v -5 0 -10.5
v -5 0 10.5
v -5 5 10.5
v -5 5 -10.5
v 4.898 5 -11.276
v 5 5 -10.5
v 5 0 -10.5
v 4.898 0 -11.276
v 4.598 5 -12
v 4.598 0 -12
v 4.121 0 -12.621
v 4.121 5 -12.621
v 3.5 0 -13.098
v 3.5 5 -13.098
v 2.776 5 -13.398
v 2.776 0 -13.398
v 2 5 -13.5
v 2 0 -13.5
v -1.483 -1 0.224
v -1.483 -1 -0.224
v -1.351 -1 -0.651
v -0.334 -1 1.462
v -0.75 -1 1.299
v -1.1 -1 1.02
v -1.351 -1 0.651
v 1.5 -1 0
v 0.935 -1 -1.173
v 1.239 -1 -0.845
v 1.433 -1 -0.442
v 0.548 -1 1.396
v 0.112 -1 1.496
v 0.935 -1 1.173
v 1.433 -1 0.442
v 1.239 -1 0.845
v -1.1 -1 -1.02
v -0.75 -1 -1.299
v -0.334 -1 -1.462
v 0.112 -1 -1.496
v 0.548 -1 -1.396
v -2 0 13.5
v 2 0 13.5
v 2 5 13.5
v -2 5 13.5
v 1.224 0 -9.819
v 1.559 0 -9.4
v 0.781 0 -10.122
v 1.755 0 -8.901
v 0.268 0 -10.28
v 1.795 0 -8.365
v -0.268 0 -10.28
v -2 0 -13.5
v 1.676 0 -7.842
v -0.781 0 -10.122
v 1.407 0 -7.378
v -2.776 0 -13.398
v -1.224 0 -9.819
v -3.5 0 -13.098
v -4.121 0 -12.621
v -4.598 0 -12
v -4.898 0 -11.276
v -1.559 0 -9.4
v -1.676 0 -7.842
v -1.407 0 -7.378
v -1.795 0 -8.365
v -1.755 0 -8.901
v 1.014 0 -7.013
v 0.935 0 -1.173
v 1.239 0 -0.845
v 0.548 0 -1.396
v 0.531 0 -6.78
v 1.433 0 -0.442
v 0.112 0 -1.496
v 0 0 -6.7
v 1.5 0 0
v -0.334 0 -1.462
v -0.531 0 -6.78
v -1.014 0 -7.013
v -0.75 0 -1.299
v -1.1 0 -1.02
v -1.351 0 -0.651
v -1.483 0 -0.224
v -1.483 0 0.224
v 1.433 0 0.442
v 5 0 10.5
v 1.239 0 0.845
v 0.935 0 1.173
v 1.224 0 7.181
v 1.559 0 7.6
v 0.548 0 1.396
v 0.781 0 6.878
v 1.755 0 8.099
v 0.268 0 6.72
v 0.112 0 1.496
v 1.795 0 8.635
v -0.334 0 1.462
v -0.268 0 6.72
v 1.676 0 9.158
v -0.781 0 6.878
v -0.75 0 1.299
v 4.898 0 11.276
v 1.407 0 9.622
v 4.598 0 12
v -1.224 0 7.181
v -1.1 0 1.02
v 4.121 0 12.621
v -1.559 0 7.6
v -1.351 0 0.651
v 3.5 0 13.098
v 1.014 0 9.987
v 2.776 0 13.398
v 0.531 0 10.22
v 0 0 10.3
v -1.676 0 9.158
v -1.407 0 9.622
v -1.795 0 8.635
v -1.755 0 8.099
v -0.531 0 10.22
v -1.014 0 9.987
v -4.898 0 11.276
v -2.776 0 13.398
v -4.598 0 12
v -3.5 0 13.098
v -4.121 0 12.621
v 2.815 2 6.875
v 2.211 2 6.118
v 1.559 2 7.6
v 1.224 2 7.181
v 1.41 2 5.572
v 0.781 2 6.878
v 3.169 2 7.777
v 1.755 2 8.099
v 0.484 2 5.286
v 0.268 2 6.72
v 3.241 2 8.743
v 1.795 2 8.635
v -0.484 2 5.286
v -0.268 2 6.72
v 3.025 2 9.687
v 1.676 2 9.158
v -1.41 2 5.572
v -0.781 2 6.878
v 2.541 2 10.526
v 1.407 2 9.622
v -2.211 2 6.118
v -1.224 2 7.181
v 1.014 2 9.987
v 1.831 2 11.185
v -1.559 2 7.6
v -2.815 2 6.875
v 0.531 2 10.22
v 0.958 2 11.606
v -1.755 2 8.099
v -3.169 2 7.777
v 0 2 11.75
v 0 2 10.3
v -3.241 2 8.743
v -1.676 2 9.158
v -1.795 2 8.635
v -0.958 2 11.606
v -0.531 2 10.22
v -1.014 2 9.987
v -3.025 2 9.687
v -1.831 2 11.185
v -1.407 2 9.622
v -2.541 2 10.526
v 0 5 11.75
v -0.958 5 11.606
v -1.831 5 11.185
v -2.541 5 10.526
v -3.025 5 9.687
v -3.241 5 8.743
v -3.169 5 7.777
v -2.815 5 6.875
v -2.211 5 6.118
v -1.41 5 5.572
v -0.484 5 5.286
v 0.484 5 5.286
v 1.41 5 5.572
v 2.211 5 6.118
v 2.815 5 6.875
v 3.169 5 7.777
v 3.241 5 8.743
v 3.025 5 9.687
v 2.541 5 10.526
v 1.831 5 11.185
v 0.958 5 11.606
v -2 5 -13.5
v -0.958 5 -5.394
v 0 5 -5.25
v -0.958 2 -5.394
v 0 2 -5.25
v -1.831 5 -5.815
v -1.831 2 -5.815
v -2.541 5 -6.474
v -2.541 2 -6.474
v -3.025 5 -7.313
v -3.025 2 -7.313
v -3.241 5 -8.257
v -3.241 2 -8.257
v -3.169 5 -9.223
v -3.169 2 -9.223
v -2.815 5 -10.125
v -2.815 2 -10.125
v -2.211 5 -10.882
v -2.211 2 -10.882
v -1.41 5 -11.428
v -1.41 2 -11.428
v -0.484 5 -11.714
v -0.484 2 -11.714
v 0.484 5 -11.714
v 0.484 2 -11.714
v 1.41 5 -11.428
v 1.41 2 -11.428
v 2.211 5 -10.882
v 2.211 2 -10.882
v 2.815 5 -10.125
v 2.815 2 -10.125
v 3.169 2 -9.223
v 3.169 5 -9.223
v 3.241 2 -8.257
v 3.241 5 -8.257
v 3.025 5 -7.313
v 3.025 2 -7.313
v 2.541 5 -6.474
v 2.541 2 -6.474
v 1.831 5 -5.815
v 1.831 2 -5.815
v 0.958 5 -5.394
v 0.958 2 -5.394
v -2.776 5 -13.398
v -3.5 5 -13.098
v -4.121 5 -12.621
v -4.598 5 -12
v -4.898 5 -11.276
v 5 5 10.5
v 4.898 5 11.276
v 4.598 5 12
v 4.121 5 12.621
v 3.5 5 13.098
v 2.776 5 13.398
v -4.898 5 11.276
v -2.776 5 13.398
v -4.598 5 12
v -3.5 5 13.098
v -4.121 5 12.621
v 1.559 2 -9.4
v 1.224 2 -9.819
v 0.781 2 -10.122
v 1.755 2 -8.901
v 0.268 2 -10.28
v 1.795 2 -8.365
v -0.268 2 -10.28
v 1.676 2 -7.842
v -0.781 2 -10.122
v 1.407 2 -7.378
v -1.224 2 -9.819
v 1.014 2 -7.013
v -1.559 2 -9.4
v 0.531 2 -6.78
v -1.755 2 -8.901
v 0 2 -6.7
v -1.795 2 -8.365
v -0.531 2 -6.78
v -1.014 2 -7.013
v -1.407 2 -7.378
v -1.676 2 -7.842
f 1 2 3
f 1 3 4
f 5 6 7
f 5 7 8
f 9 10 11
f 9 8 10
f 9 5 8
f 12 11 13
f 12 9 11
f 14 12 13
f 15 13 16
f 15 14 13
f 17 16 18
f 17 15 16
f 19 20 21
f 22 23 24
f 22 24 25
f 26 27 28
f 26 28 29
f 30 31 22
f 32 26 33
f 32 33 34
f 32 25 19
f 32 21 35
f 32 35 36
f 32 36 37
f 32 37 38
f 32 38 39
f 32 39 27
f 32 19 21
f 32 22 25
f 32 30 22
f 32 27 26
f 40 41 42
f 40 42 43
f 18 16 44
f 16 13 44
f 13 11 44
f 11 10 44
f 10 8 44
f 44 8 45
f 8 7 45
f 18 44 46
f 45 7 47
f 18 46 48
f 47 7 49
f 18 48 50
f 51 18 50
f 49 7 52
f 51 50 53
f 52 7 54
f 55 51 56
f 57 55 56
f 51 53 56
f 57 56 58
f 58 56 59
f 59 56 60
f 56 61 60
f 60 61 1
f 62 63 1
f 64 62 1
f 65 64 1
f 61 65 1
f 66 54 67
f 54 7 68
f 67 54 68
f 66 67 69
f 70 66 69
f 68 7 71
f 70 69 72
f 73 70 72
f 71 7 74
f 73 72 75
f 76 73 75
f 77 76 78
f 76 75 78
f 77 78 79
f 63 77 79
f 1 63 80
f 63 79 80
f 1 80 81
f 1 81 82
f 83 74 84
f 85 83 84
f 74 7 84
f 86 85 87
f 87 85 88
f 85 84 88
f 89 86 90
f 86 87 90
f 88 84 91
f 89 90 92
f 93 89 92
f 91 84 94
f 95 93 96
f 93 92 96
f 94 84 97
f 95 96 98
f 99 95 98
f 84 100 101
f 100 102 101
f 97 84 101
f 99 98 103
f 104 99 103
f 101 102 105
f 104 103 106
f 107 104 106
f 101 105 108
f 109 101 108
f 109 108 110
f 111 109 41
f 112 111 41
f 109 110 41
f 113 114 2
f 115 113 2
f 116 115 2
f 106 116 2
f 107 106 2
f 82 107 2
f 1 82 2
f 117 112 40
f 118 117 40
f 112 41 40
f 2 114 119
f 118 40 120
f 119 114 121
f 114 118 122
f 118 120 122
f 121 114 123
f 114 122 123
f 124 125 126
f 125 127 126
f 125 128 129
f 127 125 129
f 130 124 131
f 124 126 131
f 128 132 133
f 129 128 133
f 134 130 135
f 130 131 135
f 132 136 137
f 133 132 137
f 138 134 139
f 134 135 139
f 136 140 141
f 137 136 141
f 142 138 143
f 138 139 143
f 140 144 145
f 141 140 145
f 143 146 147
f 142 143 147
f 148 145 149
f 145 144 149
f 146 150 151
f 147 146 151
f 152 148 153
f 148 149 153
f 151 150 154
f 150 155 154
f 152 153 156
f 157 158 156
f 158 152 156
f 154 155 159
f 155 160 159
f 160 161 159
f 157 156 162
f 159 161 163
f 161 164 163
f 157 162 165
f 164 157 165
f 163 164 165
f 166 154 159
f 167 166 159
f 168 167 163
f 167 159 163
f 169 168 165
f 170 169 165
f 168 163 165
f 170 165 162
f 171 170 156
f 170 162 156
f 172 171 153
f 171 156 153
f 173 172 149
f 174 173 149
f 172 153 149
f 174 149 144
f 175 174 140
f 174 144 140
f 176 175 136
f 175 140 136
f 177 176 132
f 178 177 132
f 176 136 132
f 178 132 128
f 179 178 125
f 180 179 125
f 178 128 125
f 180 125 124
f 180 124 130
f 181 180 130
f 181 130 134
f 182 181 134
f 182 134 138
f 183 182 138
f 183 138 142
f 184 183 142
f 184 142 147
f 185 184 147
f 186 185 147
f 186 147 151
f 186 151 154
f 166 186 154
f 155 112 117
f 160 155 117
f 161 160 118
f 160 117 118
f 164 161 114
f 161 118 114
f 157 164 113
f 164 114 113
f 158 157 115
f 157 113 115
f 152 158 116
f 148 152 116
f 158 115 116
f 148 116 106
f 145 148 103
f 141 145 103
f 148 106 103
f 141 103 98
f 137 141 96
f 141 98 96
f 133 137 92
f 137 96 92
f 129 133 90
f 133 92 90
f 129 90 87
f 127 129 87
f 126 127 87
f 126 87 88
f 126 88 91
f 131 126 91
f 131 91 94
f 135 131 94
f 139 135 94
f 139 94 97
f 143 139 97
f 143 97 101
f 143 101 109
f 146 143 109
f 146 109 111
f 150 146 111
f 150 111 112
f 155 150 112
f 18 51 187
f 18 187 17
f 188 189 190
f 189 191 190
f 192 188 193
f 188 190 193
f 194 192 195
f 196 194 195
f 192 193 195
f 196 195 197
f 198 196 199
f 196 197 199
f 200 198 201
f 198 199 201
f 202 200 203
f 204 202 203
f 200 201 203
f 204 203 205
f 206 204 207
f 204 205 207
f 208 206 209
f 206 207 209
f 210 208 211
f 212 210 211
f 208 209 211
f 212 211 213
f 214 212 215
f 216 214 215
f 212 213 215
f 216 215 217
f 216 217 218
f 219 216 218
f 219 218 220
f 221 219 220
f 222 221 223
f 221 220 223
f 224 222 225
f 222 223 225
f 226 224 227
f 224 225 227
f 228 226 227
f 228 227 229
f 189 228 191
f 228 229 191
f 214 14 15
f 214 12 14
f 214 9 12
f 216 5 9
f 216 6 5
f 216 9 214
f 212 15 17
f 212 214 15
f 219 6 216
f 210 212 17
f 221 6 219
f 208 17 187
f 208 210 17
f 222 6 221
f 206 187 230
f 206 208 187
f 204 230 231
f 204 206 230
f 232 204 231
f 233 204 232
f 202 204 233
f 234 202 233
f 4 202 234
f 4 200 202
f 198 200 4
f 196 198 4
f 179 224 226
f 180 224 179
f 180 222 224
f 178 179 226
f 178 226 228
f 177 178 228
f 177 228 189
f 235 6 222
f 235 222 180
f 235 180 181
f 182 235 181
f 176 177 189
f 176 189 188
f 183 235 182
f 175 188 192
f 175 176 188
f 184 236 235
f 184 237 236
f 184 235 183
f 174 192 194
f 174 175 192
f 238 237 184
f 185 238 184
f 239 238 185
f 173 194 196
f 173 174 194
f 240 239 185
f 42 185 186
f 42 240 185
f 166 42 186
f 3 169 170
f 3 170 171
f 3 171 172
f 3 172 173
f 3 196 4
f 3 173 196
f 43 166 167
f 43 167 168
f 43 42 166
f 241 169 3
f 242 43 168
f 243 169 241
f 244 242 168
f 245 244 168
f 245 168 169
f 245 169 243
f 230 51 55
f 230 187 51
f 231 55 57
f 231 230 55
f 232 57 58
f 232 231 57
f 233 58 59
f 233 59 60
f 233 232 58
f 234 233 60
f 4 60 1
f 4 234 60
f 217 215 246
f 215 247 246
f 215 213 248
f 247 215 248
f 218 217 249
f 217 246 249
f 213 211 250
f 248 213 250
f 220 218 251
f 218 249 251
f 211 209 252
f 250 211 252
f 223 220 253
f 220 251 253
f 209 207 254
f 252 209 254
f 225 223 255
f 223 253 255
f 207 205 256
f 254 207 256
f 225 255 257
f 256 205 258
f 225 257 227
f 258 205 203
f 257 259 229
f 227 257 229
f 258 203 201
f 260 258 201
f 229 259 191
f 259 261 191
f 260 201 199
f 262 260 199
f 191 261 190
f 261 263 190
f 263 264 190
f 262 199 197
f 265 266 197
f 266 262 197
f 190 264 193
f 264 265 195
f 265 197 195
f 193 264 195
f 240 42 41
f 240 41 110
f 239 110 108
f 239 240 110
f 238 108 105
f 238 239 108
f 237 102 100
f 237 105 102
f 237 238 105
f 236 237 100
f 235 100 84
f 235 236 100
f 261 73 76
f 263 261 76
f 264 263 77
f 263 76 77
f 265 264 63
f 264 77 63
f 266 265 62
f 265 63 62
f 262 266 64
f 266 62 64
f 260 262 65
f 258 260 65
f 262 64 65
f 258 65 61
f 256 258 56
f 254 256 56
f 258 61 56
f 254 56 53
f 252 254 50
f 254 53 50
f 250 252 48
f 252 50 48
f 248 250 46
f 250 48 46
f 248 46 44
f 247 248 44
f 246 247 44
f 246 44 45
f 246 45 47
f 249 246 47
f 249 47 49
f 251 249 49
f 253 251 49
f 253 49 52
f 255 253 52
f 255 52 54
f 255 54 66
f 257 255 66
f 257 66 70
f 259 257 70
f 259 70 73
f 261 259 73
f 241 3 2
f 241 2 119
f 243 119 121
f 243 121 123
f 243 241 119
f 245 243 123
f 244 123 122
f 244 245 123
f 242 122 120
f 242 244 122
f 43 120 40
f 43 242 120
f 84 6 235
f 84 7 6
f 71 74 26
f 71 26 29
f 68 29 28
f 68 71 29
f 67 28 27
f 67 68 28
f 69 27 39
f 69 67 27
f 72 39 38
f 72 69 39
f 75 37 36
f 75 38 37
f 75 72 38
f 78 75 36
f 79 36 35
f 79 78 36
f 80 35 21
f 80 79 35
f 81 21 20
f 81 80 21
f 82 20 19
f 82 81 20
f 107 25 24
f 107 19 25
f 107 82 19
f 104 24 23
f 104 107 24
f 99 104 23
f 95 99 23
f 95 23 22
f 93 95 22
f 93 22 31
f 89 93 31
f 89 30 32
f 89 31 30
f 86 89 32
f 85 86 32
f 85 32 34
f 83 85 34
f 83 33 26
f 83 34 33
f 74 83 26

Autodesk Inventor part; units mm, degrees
ref_plane "YZ Plane" through (0, 0, 0) normal (1, 0, 0) x (0, 1, 0)
ref_plane "XZ Plane" through (0, 0, 0) normal (0, 1, 0) x (-1, 0, 0)
ref_plane "XY Plane" through (0, 0, 0) normal (0, 0, 1) x (1, 0, 0)
sketch "Sketch1" plane through (0, 0, 0) normal (0, 1, 0) x (-1, 0, 0)
  line L0 (5, -13.5) -> (-5, -13.5)
  line L1 (-5, -13.5) -> (-5, 13.5)
  line L2 (-5, 13.5) -> (5, 13.5)
  line L3 (5, 13.5) -> (5, -13.5)
  line L4 (5, -13.5) -> (-5, 13.5) construction
  line L5 (-5, -13.5) -> (5, 13.5) construction
  circle A0 centre (0, -8.5) radius 3.25
  circle A1 centre (0, 8.5) radius 3.25
  circle A2 centre (0, 0) radius 1.5
  dimension "d0" = 17
  dimension "d1" = 6.5
  dimension "d2" = 6.5
  dimension "d3" = 3
  dimension "d4" = 5
  dimension "d5" = 5
  dimension "d6" = 5
extrude "Extrusion1" add sketch "Sketch1" along normal blind 5 contours L0 L1 L2 L3 | A0 | A1 | A2
sketch "Sketch2" plane through (0, 0, 0) normal (0, -1, 0) x (1, 0, 0)
  circle A0 centre (0, 0) radius 1.5
  dimension "d9" = 3
extrude "Extrusion2" add sketch "Sketch2" along normal blind 1
sketch "Sketch3" plane through (0, 5, 0) normal (0, 1, 0) x (1, 0, 0)
  line L0 (-5, -13.5) -> (5, -13.5) projected
  line L1 (5, -13.5) -> (5, 13.5) projected
  line L2 (5, 13.5) -> (-5, 13.5) projected
  line L3 (-5, 13.5) -> (-5, -13.5) projected
  point P0 (0, 0)
  point P1 (0, 8.5)
  point P2 (0, -8.5)
  dimension "d12" = 8.5
  dimension "d13" = 8.5
hole "Hole1" at (0, 5, -8.5) at (0, 5, 8.5) direction (0, -1, 0) diameter 3.6 depth 28.25 tip angle 118 counterbore diameter 6.5 counterbore depth 3 clearance for "Socket Head Cap Screw" size "M3" standard "Ansi Metric M Profile"
fillet "Fillet1" radius 3 4 edges at (5, 2.5, 13.5) (5, 2.5, -13.5) (-5, 2.5, -13.5) (-5, 2.5, 13.5)
sketch "Sketch4" plane through (0, 2, -8.5) normal (0, 1, 0) x (1, 0, 0)
  circle A0 centre (0, 0) radius 1.8 projected
  circle A1 centre (0, -17) radius 1.8 projected
  point P0 (0, -8.5)
extrude "Extrusion3" [suppressed]
equation "\"d13\" = d12"
properties part number "Belt Clamp Block" material "ABS Plastic"
